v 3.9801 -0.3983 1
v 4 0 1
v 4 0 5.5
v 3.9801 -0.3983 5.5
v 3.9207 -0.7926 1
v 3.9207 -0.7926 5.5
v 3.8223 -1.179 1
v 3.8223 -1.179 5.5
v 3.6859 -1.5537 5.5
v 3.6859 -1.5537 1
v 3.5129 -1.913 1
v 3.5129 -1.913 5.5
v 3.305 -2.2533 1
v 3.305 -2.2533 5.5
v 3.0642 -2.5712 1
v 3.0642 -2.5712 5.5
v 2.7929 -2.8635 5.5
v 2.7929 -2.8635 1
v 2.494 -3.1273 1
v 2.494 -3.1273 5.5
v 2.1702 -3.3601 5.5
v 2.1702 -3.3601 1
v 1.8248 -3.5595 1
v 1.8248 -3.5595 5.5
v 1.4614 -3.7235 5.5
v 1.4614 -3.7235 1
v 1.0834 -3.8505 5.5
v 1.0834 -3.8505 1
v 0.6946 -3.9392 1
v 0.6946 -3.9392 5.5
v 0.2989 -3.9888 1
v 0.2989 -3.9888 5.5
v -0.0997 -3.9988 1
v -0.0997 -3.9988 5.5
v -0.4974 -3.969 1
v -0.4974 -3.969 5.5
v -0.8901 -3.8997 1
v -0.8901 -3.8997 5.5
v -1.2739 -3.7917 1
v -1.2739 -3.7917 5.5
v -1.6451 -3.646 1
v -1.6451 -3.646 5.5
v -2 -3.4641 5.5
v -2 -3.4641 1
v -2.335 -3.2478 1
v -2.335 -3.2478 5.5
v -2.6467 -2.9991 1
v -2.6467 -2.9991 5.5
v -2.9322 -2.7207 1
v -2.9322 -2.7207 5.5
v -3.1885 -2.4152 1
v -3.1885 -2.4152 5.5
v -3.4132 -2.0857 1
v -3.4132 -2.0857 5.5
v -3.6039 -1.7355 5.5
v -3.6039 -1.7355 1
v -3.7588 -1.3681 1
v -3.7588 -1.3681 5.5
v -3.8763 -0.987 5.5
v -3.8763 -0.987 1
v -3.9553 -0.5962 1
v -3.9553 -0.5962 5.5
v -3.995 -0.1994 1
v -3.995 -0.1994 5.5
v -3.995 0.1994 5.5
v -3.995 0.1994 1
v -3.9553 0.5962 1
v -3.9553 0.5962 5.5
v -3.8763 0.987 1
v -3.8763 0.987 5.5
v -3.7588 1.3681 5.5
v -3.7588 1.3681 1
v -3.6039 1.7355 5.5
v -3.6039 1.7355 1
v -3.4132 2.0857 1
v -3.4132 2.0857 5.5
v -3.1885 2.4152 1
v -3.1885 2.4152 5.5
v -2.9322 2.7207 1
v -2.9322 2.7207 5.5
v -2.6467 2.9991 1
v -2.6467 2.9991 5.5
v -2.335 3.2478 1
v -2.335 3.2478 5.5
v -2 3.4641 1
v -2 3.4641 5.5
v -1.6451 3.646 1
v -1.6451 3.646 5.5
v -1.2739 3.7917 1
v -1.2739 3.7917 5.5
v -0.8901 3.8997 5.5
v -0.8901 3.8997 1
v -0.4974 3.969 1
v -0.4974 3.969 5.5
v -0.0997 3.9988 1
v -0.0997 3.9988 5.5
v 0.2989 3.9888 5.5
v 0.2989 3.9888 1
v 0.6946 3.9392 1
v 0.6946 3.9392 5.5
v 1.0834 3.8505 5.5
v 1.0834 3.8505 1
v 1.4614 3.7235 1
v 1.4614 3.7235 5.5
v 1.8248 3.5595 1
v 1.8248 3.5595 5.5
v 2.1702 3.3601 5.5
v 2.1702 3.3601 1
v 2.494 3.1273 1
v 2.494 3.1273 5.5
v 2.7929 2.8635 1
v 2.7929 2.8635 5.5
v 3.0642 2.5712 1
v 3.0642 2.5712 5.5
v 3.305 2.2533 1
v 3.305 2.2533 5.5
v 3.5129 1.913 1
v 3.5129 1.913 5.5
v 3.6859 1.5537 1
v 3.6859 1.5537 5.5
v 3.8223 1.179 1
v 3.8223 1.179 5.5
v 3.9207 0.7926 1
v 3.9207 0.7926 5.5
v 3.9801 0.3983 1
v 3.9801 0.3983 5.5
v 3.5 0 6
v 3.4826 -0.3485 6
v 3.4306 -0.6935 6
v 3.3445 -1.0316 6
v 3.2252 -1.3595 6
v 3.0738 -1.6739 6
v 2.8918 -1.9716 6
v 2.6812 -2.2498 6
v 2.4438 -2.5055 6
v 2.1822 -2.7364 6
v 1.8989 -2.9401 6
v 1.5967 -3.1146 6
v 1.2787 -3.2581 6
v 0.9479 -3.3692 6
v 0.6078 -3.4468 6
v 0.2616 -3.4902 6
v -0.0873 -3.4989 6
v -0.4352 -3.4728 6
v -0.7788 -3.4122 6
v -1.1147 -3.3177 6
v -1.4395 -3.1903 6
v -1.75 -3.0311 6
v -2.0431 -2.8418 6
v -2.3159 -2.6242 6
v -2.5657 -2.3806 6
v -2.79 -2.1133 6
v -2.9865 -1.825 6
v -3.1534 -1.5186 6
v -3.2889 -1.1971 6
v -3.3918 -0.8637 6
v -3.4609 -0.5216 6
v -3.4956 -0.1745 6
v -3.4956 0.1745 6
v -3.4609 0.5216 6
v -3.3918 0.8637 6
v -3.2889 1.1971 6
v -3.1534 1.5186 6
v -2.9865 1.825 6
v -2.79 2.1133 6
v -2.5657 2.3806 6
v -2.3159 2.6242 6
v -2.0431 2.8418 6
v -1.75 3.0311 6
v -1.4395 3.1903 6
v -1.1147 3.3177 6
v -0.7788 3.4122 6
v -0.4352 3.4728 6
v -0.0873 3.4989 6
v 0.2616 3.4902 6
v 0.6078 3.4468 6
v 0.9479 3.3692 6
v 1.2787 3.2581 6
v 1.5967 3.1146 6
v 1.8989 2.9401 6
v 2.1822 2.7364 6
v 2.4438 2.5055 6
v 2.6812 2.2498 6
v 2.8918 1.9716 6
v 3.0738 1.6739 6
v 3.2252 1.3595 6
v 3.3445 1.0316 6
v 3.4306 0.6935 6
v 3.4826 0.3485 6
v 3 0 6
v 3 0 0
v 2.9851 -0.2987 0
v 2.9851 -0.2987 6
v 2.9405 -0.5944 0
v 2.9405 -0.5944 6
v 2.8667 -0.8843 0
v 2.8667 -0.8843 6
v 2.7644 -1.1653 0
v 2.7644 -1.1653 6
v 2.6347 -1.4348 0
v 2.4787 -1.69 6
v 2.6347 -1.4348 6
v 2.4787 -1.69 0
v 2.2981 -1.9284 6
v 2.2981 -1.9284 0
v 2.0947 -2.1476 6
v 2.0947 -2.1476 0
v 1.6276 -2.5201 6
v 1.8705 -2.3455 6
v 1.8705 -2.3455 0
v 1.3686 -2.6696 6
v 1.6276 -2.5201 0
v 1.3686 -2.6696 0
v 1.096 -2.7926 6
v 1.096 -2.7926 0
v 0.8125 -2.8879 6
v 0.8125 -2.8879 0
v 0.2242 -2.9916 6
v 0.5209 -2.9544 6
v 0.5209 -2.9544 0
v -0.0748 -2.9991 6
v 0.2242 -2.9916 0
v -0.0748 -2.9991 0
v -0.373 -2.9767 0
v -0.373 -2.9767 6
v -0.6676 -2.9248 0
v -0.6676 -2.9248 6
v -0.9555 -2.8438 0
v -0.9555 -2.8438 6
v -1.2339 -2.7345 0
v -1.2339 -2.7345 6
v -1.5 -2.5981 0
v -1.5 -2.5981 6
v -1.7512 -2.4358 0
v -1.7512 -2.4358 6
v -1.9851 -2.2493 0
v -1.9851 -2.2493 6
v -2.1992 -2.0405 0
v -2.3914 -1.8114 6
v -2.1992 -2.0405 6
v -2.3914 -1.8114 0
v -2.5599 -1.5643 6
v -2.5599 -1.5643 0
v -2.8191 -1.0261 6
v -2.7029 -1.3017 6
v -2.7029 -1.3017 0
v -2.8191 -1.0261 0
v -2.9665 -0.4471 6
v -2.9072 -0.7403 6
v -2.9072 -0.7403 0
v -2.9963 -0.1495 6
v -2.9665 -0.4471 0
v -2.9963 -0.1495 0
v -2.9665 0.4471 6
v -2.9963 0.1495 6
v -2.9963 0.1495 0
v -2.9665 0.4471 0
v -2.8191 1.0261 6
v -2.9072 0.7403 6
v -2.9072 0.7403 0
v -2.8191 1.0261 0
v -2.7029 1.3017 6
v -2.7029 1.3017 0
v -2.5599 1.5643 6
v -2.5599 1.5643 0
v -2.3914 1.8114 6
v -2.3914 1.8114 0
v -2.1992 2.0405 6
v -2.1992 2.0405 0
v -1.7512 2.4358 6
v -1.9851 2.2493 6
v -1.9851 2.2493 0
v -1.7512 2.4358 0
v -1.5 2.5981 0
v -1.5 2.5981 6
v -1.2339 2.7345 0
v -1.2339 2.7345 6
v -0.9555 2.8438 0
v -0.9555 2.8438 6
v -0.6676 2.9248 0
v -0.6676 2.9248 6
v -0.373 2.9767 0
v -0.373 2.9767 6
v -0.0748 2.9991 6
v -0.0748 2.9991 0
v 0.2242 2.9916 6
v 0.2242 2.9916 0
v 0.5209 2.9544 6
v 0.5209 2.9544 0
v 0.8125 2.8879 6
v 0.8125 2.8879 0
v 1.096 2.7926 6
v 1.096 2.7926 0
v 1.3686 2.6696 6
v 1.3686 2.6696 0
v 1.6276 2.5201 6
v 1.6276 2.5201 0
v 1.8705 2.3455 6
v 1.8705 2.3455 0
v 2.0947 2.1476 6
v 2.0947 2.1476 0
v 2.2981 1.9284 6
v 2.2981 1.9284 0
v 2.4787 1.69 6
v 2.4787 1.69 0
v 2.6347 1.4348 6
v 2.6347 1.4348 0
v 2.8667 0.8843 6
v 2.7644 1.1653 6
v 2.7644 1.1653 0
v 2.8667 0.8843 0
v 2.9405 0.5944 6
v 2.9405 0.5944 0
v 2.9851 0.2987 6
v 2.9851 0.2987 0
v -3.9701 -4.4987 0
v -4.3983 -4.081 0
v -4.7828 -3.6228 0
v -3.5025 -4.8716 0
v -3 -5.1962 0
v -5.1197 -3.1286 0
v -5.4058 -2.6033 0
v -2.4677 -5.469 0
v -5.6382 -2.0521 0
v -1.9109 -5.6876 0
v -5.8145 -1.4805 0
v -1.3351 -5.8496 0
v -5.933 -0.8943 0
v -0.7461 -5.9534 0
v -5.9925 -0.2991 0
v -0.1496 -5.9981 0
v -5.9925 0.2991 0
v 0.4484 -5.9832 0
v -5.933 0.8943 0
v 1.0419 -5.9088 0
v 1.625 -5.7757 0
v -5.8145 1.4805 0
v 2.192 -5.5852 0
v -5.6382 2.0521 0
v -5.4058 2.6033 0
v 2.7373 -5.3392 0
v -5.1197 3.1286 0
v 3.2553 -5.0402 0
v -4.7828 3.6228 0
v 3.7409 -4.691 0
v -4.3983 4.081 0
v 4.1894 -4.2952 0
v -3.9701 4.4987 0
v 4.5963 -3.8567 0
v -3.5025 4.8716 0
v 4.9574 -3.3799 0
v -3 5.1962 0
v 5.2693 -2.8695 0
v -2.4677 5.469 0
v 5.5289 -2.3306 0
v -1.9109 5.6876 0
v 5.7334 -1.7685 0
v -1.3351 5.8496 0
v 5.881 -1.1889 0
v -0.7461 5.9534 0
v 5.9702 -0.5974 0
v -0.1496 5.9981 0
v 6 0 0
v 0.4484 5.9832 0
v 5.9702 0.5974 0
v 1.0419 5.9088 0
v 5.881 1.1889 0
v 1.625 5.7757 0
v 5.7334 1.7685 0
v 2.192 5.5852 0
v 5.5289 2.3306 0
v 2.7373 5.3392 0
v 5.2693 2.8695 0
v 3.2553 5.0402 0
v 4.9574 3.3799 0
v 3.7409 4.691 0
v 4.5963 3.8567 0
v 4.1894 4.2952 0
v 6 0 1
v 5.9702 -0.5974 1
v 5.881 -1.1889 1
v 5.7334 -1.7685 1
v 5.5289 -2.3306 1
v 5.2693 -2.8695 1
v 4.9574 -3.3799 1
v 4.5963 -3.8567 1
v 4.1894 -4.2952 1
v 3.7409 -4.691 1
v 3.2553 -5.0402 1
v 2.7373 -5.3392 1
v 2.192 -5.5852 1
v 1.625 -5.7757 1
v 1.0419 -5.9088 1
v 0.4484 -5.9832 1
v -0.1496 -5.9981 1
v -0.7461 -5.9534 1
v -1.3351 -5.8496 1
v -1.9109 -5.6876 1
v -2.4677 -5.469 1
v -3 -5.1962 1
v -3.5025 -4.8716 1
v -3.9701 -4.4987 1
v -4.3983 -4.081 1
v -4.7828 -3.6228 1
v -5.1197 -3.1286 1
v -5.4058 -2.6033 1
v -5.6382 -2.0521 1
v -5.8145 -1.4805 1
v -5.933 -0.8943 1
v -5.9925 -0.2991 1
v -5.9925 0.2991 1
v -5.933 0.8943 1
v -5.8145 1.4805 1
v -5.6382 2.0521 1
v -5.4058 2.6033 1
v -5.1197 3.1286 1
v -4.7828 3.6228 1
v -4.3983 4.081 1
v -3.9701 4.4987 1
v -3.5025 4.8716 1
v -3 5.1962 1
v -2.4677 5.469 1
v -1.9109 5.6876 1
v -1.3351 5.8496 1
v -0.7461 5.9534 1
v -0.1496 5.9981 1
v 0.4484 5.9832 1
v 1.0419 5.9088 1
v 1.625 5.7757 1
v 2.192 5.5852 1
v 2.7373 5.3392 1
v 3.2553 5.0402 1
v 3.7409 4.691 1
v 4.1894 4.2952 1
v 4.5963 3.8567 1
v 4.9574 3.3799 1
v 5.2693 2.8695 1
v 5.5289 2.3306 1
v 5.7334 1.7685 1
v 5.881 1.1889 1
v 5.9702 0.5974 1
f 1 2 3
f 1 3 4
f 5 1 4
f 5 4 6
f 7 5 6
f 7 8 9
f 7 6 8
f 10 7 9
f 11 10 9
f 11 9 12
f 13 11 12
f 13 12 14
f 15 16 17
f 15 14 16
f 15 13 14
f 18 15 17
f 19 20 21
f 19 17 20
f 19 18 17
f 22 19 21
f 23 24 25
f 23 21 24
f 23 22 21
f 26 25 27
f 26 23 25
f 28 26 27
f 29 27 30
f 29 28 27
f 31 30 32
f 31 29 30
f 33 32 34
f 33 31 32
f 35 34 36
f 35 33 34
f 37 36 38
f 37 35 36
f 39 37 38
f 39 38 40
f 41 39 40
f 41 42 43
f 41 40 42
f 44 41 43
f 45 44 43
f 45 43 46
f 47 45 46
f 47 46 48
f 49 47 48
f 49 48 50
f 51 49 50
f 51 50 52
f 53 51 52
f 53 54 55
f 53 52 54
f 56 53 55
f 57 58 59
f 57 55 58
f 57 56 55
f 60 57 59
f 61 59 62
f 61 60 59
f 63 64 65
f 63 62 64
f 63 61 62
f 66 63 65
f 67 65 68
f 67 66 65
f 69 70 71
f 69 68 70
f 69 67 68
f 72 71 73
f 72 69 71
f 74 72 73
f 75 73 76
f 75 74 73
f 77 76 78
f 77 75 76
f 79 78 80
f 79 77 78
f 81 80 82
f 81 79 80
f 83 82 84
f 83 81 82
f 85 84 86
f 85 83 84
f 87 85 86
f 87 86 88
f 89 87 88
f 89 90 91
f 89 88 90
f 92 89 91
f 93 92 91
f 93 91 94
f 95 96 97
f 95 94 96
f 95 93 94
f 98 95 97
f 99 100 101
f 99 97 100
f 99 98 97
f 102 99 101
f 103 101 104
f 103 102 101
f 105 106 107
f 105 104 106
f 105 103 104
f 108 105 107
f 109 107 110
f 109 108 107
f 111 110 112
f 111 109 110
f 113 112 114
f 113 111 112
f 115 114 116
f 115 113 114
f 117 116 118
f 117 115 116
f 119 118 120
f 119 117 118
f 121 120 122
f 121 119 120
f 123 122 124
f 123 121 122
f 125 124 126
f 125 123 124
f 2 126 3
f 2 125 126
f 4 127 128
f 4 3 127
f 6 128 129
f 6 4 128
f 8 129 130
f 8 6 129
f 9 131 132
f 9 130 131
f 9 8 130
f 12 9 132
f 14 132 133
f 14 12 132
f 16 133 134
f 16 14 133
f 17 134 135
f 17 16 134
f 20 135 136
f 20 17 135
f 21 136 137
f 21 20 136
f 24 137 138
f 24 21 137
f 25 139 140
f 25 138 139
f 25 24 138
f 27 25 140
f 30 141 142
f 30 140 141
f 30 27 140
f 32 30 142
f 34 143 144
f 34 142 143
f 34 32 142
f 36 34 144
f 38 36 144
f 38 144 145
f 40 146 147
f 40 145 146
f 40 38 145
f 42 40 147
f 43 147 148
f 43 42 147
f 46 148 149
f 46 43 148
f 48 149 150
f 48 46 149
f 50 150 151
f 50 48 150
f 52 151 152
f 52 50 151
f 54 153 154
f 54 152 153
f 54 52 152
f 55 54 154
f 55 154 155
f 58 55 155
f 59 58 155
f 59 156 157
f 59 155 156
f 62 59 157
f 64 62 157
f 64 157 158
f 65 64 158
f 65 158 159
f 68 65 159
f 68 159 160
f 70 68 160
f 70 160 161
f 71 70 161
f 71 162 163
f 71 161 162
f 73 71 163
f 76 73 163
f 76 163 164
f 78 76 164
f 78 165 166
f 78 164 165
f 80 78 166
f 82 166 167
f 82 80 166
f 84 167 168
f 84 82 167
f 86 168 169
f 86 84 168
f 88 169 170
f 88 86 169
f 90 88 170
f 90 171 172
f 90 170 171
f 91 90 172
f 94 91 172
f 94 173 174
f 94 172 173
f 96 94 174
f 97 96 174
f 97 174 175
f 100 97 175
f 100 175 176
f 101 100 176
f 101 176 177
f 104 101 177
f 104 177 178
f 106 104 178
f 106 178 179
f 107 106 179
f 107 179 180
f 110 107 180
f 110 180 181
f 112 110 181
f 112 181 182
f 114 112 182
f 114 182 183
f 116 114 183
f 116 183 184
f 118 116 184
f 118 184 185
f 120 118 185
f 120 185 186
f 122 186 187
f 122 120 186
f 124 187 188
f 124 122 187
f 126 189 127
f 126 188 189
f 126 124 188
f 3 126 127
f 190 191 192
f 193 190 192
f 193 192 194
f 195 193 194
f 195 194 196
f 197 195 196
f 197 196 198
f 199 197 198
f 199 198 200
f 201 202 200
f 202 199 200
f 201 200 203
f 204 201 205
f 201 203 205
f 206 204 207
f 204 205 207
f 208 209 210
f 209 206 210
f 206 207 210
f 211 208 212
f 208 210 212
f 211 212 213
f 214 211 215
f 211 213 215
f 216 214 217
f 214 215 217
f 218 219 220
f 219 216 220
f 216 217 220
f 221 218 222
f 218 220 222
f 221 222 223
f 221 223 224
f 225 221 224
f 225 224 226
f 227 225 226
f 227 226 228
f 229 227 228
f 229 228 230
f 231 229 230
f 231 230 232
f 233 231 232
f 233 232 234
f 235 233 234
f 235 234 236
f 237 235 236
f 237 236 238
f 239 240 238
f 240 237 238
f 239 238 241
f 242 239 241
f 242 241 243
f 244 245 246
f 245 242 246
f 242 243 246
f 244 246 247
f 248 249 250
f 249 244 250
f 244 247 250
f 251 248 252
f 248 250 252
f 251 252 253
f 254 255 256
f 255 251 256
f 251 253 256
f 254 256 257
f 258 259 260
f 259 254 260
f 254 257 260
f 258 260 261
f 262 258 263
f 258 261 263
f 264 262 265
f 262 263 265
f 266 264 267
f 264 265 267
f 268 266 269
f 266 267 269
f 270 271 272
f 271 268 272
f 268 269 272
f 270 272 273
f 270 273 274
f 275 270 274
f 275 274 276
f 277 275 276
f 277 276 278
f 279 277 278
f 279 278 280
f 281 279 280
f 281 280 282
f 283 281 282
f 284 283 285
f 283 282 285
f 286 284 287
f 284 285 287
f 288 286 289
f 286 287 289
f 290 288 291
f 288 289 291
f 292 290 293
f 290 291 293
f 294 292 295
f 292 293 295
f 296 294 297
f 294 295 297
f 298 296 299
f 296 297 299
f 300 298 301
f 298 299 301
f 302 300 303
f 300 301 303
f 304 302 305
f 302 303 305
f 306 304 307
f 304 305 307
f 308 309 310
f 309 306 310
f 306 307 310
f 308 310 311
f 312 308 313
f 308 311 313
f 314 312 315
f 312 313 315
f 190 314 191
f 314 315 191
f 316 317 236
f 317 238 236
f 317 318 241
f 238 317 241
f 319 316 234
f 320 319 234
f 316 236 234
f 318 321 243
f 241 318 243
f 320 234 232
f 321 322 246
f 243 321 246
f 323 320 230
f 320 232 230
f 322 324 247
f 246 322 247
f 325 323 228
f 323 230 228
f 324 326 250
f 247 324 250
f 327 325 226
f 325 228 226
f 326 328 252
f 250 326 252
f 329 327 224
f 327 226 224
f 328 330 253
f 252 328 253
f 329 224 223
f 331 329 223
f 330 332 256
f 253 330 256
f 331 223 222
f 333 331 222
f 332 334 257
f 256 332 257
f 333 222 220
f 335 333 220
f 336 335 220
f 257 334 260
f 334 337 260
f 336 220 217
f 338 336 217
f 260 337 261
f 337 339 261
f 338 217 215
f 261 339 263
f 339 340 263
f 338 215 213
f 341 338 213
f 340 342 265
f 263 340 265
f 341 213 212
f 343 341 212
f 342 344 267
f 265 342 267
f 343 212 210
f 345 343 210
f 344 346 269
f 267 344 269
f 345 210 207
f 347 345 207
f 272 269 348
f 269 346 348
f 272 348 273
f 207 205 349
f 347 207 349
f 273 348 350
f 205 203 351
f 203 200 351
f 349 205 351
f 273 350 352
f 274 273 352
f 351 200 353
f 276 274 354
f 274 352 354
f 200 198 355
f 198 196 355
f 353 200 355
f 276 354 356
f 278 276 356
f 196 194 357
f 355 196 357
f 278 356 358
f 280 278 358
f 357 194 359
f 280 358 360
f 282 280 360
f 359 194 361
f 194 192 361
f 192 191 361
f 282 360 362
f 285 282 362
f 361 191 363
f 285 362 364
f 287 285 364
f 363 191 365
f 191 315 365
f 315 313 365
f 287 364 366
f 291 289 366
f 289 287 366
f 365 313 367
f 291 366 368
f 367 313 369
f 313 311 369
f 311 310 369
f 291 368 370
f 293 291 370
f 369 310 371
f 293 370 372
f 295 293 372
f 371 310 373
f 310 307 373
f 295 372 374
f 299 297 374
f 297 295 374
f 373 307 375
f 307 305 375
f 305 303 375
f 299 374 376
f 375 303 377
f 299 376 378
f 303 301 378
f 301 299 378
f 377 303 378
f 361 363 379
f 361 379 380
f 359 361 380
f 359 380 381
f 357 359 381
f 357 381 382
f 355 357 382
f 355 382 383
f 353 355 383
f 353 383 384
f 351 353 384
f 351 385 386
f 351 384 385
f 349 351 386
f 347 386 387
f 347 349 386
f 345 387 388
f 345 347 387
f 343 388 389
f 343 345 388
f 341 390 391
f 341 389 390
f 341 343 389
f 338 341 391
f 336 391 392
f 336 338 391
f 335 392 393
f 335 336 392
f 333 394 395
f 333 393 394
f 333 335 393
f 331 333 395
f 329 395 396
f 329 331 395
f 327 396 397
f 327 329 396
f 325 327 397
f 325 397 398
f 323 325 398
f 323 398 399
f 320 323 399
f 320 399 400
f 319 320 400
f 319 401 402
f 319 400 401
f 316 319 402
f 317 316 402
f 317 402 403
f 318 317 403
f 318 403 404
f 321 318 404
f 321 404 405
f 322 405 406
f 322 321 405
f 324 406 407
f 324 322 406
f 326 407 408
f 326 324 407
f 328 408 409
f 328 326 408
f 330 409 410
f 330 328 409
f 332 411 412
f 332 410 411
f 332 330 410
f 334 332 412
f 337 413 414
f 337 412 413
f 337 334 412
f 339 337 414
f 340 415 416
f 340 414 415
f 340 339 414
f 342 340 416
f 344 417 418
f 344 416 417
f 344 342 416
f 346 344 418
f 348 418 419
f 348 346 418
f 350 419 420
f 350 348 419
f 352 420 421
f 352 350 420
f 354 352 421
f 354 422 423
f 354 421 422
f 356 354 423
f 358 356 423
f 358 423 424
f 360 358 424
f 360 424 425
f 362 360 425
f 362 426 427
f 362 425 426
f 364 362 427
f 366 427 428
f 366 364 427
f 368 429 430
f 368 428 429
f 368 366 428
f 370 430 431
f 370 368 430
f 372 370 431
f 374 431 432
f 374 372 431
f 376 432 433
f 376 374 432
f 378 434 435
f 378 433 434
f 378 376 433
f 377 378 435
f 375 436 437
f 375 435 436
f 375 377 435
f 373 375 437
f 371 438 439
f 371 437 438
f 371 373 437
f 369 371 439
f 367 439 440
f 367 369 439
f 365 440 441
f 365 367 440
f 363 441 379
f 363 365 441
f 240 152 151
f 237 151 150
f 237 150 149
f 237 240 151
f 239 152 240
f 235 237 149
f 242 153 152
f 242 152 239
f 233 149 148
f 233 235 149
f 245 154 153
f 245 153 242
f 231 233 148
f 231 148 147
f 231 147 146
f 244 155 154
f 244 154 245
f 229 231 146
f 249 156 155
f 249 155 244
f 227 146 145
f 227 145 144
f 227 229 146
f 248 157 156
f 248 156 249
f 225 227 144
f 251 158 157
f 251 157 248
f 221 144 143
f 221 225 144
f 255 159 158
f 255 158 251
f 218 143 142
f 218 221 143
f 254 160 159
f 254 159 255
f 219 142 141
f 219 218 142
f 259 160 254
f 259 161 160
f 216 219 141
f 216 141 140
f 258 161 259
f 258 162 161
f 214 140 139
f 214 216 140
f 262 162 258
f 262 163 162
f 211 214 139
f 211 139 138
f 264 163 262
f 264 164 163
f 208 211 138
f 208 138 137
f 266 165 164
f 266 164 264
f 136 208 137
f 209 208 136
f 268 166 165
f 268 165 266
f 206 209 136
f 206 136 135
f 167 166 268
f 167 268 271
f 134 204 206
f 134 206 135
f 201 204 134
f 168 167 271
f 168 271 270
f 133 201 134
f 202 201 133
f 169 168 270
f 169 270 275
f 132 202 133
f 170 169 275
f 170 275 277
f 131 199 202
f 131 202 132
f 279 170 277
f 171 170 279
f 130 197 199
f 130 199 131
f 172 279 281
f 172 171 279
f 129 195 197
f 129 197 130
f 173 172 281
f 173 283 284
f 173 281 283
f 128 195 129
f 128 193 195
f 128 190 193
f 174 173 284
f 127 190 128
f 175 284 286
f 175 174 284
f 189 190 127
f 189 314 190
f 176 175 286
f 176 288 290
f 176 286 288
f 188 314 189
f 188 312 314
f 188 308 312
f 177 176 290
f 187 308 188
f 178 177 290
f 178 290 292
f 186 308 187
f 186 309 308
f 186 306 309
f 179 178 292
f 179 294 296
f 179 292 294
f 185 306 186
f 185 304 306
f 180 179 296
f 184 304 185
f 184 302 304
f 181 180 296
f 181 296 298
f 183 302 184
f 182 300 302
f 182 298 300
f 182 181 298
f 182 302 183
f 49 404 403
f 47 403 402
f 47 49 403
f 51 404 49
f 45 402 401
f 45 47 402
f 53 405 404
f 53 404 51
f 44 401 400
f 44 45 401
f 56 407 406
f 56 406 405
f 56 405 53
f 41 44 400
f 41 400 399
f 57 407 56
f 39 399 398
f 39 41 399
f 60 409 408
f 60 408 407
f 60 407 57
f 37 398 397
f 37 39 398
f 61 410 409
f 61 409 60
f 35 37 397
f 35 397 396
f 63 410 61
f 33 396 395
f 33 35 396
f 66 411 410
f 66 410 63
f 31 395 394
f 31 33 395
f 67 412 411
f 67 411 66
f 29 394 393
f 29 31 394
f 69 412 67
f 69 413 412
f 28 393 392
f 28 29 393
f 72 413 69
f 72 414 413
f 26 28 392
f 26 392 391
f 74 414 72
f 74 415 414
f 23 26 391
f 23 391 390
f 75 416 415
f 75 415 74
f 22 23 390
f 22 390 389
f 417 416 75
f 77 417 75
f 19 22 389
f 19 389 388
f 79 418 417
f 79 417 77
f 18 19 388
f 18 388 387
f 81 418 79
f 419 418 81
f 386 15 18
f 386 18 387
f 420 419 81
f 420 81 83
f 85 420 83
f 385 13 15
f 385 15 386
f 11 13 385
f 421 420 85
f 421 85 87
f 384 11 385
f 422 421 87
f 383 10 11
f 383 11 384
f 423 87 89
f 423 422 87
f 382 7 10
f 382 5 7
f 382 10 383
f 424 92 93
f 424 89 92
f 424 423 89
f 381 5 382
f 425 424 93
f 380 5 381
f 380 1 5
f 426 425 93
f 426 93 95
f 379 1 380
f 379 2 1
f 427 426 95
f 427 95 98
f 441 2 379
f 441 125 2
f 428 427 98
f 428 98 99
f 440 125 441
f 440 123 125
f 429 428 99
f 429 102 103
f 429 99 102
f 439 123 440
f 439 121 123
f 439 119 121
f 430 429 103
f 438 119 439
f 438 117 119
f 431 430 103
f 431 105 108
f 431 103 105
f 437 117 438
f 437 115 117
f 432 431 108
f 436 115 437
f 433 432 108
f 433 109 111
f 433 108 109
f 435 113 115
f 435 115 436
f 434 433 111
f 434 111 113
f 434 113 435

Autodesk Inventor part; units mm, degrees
ref_plane "YZ Plane" through (0, 0, 0) normal (1, 0, 0) x (0, 1, 0)
ref_plane "XZ Plane" through (0, 0, 0) normal (0, 1, 0) x (-1, 0, 0)
ref_plane "XY Plane" through (0, 0, 0) normal (0, 0, 1) x (1, 0, 0)
sketch "スケッチ1" plane through (0, 0, 0) normal (0, 0, 1) x (1, 0, 0)
  circle A0 centre (0, 0) radius 6
  circle A1 centre (0, 0) radius 3
  dimension "d0" = 12
  dimension "d1" = 6
extrude "押し出し1" add sketch "スケッチ1" along normal blind 1
sketch "スケッチ2" plane through (0, 0, 1) normal (0, 0, 1) x (1, 0, 0)
  circle A0 centre (0, 0) radius 6 projected
  circle A1 centre (0, 0) radius 3 projected
  circle A2 centre (0, 0) radius 4
  dimension "d4" = 8
extrude "押し出し2" add sketch "スケッチ2" along normal blind 5 contours A2
chamfer "面取り1" distance 0.5 angle 45 1 edges at (-4, 0, 6)
properties part number "オイレスw5f6-10a" material "アセタール樹脂、黒"
